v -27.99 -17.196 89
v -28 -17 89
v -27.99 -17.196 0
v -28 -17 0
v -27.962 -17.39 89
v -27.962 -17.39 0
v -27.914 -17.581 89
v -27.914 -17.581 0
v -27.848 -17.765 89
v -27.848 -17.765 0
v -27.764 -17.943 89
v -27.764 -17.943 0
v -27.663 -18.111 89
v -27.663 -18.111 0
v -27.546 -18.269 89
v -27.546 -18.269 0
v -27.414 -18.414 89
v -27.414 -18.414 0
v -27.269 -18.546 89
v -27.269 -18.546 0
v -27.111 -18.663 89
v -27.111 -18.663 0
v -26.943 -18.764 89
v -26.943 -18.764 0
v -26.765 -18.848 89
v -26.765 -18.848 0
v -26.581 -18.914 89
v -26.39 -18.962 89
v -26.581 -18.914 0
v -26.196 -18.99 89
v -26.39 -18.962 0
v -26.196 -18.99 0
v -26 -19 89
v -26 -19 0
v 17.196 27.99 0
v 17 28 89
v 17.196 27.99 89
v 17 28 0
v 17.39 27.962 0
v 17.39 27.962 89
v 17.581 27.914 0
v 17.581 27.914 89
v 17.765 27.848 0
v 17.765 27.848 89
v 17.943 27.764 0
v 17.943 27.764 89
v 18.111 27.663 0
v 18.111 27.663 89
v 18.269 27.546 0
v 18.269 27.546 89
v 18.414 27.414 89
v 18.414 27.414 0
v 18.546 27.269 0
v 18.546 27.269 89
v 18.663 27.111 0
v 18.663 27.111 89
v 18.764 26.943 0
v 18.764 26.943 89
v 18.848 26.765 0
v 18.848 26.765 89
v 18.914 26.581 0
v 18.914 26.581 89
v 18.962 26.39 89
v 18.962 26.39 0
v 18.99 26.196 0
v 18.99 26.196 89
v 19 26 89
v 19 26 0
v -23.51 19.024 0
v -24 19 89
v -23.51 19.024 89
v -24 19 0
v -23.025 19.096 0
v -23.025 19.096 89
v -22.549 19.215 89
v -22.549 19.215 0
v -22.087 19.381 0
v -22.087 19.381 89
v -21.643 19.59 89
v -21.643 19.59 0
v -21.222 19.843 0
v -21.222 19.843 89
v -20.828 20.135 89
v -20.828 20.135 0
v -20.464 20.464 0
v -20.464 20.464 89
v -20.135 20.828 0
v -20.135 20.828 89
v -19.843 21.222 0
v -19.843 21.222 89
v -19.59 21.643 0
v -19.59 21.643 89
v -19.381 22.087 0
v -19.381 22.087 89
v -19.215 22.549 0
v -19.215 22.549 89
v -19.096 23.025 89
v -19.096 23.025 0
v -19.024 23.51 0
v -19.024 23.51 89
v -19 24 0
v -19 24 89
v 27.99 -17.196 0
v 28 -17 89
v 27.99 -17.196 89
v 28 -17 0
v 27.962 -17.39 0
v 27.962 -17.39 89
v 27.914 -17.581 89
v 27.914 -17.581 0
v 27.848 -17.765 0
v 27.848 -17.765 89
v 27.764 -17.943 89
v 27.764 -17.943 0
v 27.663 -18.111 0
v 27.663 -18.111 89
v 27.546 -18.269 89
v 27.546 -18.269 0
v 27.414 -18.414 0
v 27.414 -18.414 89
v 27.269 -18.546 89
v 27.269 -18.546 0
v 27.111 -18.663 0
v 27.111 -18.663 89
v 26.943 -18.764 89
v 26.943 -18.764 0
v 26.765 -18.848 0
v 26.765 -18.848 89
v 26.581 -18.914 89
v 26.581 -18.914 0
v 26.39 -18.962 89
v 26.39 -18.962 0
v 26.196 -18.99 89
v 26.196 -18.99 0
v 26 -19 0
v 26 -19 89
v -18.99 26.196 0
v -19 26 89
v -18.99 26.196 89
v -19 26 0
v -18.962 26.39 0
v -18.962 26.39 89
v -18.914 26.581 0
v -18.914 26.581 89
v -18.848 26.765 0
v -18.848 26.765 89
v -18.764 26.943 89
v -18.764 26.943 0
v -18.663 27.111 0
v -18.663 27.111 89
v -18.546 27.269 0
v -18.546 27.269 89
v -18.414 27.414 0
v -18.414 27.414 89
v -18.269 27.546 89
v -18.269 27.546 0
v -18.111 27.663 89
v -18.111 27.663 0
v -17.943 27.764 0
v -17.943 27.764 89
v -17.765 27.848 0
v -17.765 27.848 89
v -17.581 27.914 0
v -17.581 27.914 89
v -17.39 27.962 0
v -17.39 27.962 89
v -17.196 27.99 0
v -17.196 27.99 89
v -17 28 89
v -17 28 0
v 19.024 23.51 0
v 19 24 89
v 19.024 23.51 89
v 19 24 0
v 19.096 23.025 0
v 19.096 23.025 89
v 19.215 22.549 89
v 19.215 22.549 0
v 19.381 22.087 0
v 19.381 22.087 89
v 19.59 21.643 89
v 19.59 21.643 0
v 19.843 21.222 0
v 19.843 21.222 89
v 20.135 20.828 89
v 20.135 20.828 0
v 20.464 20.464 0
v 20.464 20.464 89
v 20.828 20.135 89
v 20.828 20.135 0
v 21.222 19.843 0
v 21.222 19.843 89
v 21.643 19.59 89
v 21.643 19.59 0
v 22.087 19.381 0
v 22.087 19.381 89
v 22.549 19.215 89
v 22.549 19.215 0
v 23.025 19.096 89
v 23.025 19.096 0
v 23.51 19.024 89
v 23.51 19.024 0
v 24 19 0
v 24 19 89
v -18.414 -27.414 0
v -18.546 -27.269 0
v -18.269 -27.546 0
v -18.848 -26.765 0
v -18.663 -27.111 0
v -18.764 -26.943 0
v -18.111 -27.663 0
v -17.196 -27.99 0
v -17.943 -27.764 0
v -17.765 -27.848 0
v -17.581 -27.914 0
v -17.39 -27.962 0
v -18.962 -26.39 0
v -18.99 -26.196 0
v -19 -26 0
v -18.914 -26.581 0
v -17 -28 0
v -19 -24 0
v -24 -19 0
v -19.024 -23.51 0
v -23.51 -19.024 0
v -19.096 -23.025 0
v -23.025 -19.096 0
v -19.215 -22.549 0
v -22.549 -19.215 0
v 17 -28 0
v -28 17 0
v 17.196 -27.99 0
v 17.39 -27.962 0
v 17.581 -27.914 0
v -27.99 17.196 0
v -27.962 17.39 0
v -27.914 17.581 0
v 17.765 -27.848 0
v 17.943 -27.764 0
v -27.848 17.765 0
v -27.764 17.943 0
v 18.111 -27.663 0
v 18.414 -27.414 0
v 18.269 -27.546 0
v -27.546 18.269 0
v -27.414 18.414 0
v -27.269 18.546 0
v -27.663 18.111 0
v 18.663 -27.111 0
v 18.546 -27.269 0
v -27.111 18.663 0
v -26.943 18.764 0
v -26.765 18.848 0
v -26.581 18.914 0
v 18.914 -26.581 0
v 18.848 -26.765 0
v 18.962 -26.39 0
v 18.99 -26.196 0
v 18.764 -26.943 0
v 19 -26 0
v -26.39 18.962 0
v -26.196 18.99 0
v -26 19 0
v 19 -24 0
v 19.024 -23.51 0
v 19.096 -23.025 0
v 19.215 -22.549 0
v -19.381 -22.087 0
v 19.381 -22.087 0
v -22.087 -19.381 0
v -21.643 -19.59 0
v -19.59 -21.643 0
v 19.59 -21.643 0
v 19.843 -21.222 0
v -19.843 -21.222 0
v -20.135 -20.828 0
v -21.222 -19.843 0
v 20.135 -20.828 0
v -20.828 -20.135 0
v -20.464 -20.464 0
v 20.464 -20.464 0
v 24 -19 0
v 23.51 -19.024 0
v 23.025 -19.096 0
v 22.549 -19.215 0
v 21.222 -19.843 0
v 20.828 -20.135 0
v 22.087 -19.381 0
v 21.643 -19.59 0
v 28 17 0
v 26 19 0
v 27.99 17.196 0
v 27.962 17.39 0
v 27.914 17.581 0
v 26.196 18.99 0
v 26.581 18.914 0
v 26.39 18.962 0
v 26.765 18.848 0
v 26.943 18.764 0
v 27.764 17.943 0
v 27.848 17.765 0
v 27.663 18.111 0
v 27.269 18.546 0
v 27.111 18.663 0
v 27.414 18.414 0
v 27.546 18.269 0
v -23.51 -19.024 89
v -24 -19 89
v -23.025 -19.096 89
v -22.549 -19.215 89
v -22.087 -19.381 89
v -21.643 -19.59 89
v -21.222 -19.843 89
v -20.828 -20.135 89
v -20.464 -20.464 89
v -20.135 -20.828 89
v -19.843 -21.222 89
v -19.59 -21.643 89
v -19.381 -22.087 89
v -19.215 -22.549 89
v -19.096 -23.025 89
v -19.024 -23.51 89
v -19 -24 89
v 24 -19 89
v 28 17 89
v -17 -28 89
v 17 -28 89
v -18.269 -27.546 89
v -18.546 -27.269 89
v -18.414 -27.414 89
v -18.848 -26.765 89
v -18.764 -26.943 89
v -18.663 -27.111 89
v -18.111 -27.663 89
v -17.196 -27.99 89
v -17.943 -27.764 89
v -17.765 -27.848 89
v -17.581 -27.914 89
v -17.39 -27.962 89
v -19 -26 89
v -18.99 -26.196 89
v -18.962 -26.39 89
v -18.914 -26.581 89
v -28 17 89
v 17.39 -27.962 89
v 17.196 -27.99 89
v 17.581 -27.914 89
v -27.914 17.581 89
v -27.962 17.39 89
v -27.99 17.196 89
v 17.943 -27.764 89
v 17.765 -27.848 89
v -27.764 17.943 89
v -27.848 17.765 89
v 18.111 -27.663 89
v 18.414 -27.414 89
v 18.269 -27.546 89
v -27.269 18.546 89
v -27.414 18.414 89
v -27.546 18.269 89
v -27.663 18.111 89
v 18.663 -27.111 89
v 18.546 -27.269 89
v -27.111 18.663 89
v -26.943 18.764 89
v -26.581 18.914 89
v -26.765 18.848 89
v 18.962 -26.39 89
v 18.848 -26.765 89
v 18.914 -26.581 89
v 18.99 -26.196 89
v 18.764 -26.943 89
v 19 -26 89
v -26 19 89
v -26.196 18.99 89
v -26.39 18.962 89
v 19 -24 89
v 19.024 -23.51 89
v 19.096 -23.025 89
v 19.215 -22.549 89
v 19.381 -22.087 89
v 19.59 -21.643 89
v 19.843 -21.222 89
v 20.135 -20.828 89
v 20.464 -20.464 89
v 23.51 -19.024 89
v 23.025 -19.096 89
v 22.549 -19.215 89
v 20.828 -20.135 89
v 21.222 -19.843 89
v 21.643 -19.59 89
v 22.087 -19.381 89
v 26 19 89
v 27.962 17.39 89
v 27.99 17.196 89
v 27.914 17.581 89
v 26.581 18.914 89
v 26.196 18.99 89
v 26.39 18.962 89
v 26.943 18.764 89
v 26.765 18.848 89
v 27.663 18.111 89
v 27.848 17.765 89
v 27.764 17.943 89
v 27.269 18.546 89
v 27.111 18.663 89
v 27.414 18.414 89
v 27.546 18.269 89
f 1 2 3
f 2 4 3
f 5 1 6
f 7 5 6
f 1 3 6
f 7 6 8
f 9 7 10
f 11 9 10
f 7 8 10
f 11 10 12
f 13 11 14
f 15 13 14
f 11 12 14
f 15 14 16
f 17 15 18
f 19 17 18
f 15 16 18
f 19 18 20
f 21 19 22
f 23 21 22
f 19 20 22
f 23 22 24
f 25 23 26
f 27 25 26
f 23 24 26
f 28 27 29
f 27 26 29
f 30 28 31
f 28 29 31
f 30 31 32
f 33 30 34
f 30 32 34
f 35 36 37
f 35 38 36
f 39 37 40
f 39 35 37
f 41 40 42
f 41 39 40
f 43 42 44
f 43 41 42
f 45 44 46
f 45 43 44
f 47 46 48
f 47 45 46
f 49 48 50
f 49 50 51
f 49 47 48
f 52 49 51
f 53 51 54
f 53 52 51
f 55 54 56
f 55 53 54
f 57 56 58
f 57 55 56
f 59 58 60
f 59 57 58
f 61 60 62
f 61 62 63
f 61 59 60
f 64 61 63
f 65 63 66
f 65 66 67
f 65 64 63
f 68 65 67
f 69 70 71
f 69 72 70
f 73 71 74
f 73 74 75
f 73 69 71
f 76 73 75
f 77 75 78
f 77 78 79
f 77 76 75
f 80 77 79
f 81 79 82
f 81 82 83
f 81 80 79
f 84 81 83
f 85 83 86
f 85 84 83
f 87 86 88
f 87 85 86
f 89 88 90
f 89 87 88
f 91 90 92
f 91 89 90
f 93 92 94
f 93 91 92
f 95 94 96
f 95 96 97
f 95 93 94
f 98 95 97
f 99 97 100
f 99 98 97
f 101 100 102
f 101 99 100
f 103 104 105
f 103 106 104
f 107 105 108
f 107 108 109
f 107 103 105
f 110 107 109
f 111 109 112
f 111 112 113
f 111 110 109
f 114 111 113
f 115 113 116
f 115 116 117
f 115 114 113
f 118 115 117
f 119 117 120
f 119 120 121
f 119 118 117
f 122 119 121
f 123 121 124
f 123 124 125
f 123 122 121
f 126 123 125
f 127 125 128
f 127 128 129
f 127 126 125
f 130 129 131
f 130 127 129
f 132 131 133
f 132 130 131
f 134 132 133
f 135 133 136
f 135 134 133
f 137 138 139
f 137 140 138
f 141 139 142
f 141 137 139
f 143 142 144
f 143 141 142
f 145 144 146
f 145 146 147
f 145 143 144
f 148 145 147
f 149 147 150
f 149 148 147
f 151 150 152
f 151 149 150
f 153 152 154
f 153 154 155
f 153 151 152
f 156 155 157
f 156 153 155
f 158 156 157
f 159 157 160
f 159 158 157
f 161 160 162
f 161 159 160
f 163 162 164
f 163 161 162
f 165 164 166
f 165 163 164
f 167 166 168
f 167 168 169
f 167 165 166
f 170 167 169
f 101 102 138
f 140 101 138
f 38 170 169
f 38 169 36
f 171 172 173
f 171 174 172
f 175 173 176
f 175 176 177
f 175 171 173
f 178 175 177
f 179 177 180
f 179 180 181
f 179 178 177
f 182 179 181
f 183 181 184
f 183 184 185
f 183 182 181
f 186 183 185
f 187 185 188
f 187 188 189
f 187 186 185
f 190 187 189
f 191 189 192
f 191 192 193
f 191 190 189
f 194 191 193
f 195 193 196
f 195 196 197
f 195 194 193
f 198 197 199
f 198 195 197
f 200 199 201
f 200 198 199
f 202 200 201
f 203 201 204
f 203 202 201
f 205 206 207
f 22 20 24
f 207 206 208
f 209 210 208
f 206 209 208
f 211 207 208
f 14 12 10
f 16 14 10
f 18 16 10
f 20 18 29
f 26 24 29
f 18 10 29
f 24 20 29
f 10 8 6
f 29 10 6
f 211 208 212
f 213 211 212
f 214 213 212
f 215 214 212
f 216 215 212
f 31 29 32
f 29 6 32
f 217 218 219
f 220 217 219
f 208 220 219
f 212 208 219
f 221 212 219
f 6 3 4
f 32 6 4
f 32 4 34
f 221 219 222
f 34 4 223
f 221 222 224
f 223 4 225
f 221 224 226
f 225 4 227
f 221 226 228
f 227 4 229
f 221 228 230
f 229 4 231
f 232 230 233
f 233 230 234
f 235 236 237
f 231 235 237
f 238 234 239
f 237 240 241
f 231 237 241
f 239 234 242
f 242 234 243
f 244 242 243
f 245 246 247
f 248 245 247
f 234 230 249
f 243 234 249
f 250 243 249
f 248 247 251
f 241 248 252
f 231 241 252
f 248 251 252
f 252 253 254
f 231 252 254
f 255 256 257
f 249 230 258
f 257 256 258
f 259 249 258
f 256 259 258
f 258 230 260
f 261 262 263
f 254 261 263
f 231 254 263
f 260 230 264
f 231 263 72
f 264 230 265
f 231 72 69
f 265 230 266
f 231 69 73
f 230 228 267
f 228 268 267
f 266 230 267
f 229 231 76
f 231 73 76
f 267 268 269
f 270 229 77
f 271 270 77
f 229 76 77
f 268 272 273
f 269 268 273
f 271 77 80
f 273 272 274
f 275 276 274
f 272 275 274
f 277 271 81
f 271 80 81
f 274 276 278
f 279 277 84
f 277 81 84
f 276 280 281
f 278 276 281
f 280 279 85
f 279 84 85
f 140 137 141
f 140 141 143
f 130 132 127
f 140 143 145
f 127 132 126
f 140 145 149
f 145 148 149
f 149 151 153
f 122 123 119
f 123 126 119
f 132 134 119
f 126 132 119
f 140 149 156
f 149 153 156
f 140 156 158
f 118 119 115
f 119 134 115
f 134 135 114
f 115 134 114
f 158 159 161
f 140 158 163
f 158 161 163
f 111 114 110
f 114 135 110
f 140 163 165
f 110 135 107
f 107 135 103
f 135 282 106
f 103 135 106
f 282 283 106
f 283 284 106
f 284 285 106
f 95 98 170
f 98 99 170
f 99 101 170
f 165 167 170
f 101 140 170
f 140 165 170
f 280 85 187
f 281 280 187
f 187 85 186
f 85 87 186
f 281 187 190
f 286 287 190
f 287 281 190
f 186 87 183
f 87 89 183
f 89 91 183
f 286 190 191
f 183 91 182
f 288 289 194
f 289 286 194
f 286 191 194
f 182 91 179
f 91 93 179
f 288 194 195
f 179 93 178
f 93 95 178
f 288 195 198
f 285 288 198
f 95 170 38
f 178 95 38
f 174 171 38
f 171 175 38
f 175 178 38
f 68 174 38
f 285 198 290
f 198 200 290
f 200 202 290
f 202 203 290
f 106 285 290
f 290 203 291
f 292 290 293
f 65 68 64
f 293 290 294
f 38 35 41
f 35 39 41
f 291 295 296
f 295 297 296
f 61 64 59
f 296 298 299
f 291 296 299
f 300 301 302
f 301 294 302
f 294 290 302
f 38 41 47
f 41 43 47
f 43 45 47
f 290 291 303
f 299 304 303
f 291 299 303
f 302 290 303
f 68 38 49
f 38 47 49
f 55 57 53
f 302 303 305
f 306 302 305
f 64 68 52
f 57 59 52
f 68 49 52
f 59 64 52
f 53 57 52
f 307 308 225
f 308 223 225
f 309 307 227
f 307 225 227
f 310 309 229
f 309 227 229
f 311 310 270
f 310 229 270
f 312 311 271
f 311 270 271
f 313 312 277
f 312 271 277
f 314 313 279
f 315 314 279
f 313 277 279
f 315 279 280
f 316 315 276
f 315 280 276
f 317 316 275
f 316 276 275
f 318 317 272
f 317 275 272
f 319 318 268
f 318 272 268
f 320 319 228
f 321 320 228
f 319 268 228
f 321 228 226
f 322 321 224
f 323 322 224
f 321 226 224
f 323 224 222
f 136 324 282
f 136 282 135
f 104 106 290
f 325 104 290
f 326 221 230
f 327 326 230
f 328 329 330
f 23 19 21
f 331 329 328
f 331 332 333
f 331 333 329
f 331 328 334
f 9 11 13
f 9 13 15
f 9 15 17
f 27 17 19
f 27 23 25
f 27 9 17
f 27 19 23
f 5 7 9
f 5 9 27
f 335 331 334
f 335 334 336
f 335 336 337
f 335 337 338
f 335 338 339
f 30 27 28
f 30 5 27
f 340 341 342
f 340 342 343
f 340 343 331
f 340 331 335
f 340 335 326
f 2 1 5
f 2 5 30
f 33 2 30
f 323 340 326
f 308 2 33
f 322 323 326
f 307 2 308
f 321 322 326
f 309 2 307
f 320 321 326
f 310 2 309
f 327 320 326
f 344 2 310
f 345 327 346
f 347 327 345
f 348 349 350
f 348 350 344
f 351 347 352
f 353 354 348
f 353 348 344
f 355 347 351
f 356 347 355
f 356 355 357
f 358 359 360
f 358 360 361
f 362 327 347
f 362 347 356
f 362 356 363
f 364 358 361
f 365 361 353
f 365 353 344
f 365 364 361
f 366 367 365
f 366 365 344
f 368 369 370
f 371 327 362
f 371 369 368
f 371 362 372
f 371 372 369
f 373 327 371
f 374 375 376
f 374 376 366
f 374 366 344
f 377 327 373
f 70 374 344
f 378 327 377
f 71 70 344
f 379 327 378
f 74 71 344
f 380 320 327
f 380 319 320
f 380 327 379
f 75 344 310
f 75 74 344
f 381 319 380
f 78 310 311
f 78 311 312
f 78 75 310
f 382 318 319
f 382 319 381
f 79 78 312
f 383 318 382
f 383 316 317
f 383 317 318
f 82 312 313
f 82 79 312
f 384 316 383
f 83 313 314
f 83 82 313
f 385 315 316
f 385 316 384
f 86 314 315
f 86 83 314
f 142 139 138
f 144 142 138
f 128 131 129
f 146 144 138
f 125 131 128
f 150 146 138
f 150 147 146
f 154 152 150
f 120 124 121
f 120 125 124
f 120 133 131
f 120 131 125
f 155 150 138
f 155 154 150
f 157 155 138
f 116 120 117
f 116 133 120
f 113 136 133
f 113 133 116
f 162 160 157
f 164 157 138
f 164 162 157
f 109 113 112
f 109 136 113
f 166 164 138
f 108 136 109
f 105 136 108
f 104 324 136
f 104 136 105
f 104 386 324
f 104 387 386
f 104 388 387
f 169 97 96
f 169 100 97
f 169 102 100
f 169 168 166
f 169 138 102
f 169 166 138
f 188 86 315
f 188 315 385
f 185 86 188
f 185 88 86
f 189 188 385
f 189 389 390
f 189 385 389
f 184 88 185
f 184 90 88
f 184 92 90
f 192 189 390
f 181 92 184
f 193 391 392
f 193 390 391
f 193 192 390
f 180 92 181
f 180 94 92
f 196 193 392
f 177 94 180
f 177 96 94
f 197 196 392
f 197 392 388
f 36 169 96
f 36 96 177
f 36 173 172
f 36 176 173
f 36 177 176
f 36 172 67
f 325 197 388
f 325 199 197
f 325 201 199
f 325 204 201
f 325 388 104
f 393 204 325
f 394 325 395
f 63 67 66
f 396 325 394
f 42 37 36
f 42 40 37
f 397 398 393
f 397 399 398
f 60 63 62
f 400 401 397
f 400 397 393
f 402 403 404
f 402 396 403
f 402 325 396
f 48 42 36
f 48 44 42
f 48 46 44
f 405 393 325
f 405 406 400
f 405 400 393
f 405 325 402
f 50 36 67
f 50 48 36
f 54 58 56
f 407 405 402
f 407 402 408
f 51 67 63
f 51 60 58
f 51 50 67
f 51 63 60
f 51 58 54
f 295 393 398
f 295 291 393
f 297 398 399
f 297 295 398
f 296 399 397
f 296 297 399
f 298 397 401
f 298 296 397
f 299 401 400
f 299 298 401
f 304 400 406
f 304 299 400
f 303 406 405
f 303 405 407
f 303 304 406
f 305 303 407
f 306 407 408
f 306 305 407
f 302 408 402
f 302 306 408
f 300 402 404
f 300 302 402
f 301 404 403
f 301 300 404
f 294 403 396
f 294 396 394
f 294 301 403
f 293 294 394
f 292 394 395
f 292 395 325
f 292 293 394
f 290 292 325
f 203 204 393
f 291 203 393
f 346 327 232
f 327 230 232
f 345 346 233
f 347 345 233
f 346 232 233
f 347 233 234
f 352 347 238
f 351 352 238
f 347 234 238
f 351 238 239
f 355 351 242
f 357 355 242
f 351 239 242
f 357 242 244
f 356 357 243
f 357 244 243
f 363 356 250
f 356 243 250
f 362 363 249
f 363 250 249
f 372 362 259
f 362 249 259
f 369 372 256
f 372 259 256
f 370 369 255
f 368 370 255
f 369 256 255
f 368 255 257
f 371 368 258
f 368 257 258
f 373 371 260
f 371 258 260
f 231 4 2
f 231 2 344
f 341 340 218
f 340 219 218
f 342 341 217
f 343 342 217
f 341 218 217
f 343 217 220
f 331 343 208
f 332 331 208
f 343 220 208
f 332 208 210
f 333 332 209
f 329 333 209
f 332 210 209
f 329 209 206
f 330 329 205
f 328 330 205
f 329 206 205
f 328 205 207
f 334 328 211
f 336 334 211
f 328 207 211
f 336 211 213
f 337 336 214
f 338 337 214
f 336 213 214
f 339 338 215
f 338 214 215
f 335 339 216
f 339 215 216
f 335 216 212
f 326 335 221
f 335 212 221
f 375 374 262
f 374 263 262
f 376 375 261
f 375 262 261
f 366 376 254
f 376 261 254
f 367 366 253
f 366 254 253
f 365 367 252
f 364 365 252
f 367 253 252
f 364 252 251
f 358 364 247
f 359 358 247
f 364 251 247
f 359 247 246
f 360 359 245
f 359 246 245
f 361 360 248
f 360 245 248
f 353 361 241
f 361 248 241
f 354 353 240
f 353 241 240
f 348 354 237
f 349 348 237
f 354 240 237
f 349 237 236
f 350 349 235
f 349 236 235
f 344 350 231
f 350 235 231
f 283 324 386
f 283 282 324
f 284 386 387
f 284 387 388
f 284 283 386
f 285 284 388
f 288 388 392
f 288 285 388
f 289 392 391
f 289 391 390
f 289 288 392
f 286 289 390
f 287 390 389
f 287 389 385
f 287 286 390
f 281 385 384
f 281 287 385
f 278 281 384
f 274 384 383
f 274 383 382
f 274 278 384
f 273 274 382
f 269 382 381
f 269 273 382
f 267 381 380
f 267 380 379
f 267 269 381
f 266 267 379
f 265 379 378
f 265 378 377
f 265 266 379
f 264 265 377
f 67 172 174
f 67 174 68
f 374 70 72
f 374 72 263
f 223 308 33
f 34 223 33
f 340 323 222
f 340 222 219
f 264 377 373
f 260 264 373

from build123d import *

# Parameters (mm, degrees)
SKETCH1_W           = 56
SKETCH1_H           = 56
BOSS_EXTRUDE1_DEPTH = 89
SKETCH2_W           = 9
SKETCH2_H           = 9
CUT_EXTRUDE1_DEPTH  = 89
CIRPATTERN1_COUNT   = 4
FILLET1_R           = 5
FILLET2_R           = 2


with BuildPart() as part:
    # Sketch1 → Boss-Extrude1 (new body)
    with BuildSketch(Plane.XY):
        Rectangle(SKETCH1_W, SKETCH1_H)
    extrude(amount=BOSS_EXTRUDE1_DEPTH)

    # Sketch2 → Cut-Extrude1 (cut)
    with BuildSketch(Plane.XY.offset(89)):
        with Locations((23.5, 23.5)):
            Rectangle(SKETCH2_W, SKETCH2_H)
    cut_extrude1 = extrude(amount=-CUT_EXTRUDE1_DEPTH, mode=Mode.SUBTRACT)

    # CirPattern1: Cut-Extrude1 ×4 about axis
    cirpattern1_axis = Axis((0, 0, -4.45), (0, 0, 1))
    for i in range(1, CIRPATTERN1_COUNT):
        add(cut_extrude1.rotate(cirpattern1_axis, i * 360 / CIRPATTERN1_COUNT), mode=Mode.SUBTRACT)

    # Fillet1
    fillet1_edges = [part.edges().sort_by_distance(p)[0] for p in [
        (19, 19, 44.5),
        (-19, 19, 44.5),
        (-19, -19, 44.5),
        (19, -19, 44.5),
    ]]
    fillet(fillet1_edges, radius=FILLET1_R)

    # Fillet2
    fillet2_edges = [part.edges().sort_by_distance(p)[0] for p in [
        (19, 28, 44.5),
        (28, 19, 44.5),
        (28, -19, 44.5),
        (19, -28, 44.5),
        (-19, -28, 44.5),
        (-28, -19, 44.5),
        (-28, 19, 44.5),
        (-19, 28, 44.5),
    ]]
    fillet(fillet2_edges, radius=FILLET2_R)


solid = part.part
